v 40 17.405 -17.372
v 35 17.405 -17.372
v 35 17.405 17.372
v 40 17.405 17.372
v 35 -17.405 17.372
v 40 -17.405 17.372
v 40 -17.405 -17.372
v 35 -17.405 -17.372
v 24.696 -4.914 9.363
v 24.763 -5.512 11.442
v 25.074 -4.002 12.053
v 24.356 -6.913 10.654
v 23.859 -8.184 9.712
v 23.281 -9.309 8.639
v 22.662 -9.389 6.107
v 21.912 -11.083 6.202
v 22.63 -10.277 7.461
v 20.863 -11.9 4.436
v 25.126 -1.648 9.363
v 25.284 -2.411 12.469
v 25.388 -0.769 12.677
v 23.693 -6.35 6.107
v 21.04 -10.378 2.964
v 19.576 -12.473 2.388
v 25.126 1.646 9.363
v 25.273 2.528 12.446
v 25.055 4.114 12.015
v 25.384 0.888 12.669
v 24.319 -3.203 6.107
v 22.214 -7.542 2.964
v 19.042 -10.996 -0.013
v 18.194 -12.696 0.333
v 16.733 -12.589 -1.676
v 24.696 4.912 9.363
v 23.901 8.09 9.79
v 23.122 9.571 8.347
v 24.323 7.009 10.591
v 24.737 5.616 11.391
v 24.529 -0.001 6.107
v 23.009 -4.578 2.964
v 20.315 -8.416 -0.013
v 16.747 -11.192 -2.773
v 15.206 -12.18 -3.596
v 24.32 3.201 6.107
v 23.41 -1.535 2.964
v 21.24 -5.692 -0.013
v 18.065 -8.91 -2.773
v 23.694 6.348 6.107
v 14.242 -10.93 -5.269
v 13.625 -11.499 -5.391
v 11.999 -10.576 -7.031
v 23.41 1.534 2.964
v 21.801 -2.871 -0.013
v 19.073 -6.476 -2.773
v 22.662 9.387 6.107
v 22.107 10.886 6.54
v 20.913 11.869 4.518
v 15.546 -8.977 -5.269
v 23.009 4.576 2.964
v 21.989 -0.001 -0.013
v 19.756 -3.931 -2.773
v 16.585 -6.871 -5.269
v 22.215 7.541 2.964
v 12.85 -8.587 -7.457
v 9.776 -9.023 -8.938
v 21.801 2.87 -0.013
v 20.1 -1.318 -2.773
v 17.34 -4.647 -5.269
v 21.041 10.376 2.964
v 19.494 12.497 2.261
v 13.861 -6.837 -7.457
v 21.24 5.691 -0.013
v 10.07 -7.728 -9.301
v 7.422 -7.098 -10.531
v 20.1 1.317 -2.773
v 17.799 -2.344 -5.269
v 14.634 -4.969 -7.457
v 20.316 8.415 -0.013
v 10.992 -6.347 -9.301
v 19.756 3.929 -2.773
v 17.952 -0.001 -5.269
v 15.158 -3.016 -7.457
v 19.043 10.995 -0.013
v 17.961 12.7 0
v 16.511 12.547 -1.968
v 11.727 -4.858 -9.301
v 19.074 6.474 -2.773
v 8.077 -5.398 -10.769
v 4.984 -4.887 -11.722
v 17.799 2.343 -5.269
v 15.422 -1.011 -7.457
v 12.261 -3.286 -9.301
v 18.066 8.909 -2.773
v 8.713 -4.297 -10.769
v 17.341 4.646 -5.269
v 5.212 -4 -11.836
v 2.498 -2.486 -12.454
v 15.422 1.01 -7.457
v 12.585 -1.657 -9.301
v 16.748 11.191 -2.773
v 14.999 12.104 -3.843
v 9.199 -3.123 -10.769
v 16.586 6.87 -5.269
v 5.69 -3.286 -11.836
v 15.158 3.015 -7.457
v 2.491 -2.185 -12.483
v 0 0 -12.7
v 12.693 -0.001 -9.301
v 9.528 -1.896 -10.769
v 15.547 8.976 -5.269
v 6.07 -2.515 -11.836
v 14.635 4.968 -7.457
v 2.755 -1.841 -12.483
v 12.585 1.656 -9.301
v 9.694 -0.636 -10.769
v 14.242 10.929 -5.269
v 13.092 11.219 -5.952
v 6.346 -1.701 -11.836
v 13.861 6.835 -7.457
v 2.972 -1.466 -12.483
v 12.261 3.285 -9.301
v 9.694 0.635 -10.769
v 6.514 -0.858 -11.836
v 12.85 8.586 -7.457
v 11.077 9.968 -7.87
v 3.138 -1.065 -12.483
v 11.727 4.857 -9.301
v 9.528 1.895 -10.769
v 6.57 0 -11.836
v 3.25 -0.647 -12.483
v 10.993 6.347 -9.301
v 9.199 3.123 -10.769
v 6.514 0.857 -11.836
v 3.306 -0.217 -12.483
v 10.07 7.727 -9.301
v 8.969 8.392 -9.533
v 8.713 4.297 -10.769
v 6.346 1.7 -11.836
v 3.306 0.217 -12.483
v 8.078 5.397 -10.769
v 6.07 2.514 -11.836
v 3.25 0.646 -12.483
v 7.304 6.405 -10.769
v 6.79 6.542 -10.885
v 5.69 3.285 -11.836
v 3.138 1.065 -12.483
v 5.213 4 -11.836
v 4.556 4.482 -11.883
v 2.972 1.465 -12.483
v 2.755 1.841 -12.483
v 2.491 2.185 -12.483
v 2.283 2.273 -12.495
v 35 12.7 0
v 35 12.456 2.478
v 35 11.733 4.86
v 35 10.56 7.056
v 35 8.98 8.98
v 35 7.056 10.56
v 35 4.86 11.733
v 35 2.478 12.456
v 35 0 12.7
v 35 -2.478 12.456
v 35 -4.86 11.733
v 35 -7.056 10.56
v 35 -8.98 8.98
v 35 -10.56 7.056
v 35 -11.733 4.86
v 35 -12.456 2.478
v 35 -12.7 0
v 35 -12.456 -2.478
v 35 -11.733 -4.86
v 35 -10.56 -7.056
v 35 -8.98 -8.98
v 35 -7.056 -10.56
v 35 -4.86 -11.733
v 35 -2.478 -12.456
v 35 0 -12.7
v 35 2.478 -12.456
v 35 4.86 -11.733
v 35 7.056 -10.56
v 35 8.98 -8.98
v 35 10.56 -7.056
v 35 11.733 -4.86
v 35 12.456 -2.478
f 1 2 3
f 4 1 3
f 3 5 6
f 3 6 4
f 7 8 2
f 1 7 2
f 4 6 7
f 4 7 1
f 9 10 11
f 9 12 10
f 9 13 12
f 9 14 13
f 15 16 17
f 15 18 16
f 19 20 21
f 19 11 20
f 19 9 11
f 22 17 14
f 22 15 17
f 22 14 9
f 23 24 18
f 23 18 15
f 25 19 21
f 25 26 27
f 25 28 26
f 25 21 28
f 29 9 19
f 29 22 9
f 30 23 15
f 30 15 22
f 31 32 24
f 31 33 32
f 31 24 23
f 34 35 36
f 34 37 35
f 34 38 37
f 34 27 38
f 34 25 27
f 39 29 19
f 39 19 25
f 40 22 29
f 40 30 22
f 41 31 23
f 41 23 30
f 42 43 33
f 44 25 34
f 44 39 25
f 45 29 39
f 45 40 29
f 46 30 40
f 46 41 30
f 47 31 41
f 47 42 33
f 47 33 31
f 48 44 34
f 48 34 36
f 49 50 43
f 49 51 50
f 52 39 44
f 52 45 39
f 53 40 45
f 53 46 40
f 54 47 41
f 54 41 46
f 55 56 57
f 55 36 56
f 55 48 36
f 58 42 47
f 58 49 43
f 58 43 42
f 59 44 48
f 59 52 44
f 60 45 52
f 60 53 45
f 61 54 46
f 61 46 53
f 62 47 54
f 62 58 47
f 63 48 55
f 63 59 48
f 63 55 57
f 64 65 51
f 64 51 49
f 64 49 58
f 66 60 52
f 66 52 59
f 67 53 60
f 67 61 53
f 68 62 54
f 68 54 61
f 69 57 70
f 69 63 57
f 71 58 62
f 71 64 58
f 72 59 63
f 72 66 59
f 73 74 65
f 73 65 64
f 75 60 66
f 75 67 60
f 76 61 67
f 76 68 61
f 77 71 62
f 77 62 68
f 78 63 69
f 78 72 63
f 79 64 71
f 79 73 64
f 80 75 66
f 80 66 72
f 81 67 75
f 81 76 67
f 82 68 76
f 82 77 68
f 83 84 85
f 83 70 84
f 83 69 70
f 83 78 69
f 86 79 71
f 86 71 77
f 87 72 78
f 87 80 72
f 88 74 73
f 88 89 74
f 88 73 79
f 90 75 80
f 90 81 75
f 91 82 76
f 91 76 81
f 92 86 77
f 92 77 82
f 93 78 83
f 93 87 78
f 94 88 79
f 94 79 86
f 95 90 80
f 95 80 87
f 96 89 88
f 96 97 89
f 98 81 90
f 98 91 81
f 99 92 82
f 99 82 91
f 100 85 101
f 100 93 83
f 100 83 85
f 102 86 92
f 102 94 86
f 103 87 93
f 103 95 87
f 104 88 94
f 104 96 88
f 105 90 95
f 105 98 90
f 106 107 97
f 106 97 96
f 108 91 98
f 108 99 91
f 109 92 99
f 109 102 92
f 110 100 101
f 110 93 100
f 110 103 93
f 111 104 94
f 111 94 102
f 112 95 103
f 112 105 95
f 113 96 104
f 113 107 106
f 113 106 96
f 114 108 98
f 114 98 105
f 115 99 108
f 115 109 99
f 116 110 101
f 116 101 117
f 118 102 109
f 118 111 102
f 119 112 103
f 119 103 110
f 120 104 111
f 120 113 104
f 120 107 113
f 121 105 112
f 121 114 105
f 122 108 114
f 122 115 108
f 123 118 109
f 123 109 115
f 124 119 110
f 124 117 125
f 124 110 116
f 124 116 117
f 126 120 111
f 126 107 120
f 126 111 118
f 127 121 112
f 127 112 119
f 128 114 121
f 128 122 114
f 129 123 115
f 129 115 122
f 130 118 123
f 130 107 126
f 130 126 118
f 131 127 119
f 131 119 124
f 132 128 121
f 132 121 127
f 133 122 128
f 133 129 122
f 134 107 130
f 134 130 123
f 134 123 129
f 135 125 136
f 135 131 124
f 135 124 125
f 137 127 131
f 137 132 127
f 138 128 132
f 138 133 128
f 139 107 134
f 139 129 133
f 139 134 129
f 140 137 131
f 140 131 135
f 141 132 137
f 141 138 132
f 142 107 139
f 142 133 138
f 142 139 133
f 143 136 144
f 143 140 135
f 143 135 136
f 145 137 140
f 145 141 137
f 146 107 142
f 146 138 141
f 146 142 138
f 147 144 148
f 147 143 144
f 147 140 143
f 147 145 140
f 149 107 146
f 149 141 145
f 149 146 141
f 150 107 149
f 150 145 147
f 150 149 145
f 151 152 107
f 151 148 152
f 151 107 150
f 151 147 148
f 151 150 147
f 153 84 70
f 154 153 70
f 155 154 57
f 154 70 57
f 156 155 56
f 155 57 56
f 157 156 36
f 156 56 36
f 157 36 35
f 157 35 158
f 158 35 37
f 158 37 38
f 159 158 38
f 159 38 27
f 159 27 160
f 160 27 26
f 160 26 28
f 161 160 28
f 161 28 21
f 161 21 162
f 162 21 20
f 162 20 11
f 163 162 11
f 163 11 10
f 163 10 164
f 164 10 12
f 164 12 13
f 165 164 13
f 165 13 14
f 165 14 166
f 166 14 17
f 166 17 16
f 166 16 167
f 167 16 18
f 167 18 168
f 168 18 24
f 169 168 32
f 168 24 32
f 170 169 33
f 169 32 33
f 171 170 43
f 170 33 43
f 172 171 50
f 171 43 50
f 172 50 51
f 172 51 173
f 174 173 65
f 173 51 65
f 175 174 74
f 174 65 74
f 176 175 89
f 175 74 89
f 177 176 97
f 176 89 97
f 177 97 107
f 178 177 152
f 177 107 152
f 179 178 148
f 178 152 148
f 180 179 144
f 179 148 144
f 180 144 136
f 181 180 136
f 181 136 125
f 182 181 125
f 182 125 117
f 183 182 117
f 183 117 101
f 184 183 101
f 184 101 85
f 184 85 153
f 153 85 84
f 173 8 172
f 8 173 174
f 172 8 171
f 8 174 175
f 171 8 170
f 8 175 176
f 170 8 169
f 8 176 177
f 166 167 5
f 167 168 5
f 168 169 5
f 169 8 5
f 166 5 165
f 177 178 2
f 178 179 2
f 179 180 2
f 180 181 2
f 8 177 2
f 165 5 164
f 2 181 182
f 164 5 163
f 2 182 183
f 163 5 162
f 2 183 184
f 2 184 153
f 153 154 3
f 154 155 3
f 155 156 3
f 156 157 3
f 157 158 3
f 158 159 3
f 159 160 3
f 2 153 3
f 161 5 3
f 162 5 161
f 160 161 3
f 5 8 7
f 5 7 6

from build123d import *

# Parameters (mm, degrees)
F0_R     = 12.7
F1_DEPTH = 35
F2_W     = 34.810588
F2_H     = 34.74434
F3_DEPTH = 5


with BuildPart() as f1:
    # F0 (on Right) → F1 (new body)
    with BuildSketch(Plane.YZ):
        Circle(F0_R)
    extrude(amount=F1_DEPTH)

    # F2 (on face) → F3 (join)
    with BuildSketch(Plane.YZ.offset(35)):
        Rectangle(F2_W, F2_H)
    extrude(amount=F3_DEPTH)

    # F4 (on face) → F5 (revolve, cut)
    with BuildSketch(Plane(origin=(0, 0, 0), x_dir=(0, -1, 0), z_dir=(-1, 0, 0))):
        with BuildLine():
            ThreePointArc((0, 38.1), (-25.4, 12.7), (0, -12.7))
            Line((0, -12.7), (0, 38.1))
        make_face()
    revolve(axis=Axis((0, 0, 12.7), (0, 0, 1)), mode=Mode.SUBTRACT)


solid = f1.part
